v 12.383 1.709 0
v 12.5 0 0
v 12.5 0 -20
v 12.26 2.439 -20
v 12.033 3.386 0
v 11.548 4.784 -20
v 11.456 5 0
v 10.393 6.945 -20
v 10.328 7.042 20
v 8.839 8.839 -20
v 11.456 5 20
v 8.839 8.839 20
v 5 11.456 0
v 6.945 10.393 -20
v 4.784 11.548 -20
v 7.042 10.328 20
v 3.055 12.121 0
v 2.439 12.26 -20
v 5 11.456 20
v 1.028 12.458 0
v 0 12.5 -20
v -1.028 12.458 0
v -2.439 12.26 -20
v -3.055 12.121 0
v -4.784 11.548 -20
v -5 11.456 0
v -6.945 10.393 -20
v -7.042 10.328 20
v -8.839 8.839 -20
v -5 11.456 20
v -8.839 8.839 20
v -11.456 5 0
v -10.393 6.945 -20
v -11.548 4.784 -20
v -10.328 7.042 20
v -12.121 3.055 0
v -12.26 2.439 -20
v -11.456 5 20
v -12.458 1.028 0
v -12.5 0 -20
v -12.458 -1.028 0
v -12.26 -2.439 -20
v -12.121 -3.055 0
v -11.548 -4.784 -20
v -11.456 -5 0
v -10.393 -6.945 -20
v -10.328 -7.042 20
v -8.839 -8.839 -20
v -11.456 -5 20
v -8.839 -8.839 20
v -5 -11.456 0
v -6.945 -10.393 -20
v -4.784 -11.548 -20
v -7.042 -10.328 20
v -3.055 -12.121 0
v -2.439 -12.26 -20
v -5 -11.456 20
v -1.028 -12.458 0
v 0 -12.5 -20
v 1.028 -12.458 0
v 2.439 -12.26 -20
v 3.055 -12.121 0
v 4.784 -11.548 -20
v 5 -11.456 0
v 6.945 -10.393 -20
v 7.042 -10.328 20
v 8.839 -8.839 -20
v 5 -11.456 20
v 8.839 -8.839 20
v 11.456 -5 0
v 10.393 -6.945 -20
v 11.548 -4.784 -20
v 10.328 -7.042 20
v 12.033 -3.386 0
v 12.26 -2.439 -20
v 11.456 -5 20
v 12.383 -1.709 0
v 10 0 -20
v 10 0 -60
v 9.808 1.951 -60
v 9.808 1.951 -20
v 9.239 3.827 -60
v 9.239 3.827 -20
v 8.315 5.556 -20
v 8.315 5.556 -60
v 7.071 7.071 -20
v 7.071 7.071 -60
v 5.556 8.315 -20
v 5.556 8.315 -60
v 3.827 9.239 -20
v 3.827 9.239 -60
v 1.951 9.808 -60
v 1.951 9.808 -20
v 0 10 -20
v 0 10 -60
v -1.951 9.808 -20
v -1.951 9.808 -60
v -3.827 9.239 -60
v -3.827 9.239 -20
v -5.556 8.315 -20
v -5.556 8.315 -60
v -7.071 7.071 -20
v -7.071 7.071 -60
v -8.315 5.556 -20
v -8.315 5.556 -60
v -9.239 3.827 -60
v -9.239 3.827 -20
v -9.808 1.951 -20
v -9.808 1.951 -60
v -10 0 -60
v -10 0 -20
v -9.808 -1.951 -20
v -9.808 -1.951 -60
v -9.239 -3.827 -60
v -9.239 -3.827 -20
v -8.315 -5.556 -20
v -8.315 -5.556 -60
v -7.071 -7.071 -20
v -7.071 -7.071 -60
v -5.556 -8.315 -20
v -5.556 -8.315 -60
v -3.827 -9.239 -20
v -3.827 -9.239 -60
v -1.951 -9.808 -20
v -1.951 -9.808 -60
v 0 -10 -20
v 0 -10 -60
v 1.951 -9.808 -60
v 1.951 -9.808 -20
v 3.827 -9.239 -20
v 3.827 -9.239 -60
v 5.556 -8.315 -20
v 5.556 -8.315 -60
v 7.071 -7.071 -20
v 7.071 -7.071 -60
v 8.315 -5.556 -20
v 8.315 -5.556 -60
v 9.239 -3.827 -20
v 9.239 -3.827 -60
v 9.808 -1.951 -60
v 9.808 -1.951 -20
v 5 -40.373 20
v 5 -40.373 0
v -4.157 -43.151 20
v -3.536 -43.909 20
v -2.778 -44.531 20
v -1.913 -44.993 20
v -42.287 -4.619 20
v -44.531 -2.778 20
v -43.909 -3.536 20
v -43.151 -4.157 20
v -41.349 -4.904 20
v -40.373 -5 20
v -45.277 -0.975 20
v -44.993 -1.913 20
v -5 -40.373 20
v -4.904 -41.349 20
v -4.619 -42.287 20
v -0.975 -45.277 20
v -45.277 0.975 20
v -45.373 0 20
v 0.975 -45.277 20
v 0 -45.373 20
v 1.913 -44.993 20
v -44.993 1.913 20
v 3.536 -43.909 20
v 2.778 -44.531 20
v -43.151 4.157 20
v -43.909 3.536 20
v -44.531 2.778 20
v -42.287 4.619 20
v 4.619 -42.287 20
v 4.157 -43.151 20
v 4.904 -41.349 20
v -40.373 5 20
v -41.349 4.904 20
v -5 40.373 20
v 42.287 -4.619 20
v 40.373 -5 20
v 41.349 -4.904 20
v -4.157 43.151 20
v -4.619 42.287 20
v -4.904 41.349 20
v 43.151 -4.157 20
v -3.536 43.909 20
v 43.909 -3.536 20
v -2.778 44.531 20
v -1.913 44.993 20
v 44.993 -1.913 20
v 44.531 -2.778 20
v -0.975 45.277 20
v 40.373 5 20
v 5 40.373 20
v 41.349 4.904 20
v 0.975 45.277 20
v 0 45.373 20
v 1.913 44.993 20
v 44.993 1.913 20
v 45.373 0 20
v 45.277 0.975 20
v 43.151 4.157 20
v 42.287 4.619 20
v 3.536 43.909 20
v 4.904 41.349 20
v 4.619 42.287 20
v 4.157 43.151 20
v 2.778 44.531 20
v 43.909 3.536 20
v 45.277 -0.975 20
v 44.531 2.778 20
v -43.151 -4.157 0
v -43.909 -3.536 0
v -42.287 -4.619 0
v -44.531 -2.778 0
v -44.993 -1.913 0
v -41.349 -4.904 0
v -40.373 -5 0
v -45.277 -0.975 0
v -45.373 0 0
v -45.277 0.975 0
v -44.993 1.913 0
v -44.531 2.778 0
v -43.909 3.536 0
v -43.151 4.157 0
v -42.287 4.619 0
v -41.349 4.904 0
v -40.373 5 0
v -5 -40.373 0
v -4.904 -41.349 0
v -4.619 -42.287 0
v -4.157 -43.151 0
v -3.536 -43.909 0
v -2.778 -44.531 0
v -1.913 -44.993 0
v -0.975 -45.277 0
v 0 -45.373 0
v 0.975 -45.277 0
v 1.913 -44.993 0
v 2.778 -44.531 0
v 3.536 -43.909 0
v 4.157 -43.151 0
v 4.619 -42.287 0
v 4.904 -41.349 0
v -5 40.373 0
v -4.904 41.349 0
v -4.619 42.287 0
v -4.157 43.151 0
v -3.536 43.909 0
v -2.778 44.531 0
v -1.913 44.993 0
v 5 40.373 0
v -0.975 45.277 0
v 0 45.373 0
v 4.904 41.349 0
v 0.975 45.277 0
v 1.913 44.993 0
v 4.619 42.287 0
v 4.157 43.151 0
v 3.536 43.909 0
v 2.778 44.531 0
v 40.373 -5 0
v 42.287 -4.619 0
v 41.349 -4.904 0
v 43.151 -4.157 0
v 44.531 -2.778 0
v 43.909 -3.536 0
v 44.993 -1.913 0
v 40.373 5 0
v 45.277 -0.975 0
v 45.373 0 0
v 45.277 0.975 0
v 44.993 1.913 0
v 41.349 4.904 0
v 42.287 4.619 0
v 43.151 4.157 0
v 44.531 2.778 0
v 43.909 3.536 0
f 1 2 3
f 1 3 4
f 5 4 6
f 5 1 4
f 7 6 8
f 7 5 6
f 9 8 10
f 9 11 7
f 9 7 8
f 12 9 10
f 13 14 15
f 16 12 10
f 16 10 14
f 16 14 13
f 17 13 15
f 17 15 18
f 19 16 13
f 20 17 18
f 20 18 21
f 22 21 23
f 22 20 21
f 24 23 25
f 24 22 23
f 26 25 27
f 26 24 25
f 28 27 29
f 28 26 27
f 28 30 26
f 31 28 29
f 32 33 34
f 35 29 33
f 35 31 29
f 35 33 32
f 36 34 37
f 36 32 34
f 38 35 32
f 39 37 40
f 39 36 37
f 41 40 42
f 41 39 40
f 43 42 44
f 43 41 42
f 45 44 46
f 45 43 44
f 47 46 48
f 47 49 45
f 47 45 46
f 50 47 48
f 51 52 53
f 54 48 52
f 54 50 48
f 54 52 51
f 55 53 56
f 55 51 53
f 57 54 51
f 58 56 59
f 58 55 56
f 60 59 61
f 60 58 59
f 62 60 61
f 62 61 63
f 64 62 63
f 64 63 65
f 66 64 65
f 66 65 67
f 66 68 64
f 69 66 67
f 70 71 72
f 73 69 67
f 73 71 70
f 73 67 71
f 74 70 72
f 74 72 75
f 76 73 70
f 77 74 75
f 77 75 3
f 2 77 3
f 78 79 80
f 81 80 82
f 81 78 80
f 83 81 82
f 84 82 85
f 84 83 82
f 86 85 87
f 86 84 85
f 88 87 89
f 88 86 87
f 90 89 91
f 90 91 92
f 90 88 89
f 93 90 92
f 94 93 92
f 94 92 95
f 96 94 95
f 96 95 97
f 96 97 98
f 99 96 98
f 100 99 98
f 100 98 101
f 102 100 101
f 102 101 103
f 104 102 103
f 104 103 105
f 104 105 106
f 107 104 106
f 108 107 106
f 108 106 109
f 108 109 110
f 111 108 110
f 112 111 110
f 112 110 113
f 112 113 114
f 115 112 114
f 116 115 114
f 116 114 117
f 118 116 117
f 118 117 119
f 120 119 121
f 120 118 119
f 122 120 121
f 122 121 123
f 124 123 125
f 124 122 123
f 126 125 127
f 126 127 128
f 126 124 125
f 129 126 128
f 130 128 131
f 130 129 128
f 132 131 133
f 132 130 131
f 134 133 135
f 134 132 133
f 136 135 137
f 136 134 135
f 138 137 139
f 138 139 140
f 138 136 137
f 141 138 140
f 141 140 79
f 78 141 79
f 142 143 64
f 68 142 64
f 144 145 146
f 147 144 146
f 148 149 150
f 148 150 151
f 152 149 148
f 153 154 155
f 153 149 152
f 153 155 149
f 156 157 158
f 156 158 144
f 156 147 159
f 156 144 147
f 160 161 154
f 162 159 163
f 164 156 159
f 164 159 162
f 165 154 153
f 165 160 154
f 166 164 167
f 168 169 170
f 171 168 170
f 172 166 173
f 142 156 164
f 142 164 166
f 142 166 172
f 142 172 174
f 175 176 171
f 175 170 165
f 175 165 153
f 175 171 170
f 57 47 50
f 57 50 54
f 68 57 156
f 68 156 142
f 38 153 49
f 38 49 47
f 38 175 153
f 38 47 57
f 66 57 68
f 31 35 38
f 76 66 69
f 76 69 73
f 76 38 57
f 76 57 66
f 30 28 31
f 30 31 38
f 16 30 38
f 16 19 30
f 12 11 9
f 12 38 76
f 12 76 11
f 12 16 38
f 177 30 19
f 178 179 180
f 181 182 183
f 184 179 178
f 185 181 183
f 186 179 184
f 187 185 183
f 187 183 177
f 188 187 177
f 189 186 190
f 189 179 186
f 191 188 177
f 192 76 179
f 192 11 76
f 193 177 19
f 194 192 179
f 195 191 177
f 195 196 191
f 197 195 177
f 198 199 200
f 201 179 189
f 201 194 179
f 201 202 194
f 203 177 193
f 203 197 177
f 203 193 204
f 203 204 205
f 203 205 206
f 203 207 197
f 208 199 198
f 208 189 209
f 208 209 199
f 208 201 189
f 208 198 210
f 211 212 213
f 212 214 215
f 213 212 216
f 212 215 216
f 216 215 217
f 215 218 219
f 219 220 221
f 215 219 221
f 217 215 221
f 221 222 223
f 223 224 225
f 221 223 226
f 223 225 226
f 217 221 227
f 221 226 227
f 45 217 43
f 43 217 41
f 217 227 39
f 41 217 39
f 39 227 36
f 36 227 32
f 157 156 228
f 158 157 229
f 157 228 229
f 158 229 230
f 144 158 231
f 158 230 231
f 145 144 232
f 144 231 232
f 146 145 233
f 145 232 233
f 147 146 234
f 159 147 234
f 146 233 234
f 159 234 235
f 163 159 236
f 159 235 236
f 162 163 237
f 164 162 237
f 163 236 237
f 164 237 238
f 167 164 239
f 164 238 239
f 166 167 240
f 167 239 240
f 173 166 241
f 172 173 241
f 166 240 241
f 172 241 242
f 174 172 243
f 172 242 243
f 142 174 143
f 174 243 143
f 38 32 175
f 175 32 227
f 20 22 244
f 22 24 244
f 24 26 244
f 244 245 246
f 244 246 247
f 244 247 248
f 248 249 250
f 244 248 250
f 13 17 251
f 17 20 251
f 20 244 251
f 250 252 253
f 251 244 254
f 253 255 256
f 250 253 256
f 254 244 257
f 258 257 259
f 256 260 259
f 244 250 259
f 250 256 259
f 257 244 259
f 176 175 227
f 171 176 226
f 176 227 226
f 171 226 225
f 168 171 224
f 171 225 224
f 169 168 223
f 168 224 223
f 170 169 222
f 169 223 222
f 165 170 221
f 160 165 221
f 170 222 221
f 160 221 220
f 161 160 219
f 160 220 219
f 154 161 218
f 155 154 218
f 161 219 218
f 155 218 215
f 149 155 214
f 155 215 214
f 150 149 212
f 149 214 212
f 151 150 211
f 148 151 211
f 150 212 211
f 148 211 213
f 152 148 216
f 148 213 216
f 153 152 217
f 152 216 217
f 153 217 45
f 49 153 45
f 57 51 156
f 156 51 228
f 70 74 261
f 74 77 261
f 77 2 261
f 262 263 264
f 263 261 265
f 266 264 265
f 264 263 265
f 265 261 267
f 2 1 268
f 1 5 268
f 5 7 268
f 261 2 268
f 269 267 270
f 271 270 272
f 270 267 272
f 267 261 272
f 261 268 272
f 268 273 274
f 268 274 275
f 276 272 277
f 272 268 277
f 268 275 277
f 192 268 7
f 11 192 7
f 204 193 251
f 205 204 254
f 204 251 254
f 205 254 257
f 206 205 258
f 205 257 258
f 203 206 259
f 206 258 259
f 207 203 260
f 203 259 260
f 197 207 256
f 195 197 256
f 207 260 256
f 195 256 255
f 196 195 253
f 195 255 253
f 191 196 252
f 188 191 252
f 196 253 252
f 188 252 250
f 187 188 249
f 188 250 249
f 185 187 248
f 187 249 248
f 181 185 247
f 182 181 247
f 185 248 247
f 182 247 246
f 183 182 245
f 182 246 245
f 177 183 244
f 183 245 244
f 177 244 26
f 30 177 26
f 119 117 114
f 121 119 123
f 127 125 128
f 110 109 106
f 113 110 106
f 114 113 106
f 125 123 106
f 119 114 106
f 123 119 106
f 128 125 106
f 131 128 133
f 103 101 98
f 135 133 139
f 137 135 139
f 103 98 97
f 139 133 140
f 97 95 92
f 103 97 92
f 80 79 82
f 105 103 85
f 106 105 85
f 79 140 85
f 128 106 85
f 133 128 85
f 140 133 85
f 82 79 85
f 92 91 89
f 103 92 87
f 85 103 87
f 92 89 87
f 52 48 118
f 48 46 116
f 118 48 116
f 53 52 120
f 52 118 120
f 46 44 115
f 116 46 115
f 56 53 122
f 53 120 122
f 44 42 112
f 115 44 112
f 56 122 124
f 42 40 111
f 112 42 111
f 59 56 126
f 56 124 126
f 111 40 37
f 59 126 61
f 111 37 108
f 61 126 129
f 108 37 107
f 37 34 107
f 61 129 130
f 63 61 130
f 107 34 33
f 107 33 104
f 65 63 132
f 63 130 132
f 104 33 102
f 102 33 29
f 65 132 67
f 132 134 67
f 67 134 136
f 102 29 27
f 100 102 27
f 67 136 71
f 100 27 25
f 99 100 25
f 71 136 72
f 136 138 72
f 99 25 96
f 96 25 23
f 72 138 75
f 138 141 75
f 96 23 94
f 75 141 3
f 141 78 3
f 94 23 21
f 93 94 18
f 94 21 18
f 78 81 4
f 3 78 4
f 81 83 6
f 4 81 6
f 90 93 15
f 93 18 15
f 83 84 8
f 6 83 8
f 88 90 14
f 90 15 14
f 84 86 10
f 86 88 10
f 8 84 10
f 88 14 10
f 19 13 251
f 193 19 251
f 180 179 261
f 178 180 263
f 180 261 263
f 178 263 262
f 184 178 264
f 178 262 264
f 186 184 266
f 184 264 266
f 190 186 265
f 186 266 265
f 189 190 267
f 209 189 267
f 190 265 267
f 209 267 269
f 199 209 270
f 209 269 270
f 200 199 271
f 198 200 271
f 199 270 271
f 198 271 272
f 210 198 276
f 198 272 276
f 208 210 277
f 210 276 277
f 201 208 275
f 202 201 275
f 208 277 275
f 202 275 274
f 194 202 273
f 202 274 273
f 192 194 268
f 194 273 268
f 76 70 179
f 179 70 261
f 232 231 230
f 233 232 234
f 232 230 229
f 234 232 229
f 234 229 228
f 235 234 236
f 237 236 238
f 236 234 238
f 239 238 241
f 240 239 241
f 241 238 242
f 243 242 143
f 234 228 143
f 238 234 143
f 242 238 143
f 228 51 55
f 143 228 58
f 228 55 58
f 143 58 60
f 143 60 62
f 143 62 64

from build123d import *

# Parameters (mm, degrees)
BOSS_EXTRUDE1_DEPTH = 20
SKETCH2_R           = 10
BOSS_EXTRUDE2_DEPTH = 80
SKETCH3_R           = 12.5
BOSS_EXTRUDE3_DEPTH = 40


with BuildPart() as part:
    # Sketch1 → Boss-Extrude1 (new body)
    with BuildSketch(Plane.XY):
        with BuildLine():
            Line((-40.373207368, -5), (-5, -5))
            Line((-5, -5), (-5, -40.373207368))
            ThreePointArc((-5, -40.373207368), (0, -45.373207368), (5, -40.373207368))
            Line((5, -40.373207368), (5, -5))
            Line((5, -5), (40.373207368, -5))
            ThreePointArc((40.373207368, -5), (45.373207368, 0), (40.373207368, 5))
            Line((40.373207368, 5), (5, 5))
            Line((5, 5), (5, 40.373207368))
            ThreePointArc((5, 40.373207368), (0, 45.373207368), (-5, 40.373207368))
            Line((-5, 40.373207368), (-5, 5))
            Line((-5, 5), (-40.373207368, 5))
            ThreePointArc((-40.373207368, 5), (-45.373207368, 0), (-40.373207368, -5))
        make_face()
    extrude(amount=BOSS_EXTRUDE1_DEPTH)

    # Sketch2 → Boss-Extrude2 (add)
    with BuildSketch(Plane.XY.offset(20)):
        Circle(SKETCH2_R)
    extrude(amount=-BOSS_EXTRUDE2_DEPTH)

    # Sketch3 → Boss-Extrude3 (add)
    with BuildSketch(Plane.XY.offset(20)):
        Circle(SKETCH3_R)
    extrude(amount=-BOSS_EXTRUDE3_DEPTH)


solid = part.part
